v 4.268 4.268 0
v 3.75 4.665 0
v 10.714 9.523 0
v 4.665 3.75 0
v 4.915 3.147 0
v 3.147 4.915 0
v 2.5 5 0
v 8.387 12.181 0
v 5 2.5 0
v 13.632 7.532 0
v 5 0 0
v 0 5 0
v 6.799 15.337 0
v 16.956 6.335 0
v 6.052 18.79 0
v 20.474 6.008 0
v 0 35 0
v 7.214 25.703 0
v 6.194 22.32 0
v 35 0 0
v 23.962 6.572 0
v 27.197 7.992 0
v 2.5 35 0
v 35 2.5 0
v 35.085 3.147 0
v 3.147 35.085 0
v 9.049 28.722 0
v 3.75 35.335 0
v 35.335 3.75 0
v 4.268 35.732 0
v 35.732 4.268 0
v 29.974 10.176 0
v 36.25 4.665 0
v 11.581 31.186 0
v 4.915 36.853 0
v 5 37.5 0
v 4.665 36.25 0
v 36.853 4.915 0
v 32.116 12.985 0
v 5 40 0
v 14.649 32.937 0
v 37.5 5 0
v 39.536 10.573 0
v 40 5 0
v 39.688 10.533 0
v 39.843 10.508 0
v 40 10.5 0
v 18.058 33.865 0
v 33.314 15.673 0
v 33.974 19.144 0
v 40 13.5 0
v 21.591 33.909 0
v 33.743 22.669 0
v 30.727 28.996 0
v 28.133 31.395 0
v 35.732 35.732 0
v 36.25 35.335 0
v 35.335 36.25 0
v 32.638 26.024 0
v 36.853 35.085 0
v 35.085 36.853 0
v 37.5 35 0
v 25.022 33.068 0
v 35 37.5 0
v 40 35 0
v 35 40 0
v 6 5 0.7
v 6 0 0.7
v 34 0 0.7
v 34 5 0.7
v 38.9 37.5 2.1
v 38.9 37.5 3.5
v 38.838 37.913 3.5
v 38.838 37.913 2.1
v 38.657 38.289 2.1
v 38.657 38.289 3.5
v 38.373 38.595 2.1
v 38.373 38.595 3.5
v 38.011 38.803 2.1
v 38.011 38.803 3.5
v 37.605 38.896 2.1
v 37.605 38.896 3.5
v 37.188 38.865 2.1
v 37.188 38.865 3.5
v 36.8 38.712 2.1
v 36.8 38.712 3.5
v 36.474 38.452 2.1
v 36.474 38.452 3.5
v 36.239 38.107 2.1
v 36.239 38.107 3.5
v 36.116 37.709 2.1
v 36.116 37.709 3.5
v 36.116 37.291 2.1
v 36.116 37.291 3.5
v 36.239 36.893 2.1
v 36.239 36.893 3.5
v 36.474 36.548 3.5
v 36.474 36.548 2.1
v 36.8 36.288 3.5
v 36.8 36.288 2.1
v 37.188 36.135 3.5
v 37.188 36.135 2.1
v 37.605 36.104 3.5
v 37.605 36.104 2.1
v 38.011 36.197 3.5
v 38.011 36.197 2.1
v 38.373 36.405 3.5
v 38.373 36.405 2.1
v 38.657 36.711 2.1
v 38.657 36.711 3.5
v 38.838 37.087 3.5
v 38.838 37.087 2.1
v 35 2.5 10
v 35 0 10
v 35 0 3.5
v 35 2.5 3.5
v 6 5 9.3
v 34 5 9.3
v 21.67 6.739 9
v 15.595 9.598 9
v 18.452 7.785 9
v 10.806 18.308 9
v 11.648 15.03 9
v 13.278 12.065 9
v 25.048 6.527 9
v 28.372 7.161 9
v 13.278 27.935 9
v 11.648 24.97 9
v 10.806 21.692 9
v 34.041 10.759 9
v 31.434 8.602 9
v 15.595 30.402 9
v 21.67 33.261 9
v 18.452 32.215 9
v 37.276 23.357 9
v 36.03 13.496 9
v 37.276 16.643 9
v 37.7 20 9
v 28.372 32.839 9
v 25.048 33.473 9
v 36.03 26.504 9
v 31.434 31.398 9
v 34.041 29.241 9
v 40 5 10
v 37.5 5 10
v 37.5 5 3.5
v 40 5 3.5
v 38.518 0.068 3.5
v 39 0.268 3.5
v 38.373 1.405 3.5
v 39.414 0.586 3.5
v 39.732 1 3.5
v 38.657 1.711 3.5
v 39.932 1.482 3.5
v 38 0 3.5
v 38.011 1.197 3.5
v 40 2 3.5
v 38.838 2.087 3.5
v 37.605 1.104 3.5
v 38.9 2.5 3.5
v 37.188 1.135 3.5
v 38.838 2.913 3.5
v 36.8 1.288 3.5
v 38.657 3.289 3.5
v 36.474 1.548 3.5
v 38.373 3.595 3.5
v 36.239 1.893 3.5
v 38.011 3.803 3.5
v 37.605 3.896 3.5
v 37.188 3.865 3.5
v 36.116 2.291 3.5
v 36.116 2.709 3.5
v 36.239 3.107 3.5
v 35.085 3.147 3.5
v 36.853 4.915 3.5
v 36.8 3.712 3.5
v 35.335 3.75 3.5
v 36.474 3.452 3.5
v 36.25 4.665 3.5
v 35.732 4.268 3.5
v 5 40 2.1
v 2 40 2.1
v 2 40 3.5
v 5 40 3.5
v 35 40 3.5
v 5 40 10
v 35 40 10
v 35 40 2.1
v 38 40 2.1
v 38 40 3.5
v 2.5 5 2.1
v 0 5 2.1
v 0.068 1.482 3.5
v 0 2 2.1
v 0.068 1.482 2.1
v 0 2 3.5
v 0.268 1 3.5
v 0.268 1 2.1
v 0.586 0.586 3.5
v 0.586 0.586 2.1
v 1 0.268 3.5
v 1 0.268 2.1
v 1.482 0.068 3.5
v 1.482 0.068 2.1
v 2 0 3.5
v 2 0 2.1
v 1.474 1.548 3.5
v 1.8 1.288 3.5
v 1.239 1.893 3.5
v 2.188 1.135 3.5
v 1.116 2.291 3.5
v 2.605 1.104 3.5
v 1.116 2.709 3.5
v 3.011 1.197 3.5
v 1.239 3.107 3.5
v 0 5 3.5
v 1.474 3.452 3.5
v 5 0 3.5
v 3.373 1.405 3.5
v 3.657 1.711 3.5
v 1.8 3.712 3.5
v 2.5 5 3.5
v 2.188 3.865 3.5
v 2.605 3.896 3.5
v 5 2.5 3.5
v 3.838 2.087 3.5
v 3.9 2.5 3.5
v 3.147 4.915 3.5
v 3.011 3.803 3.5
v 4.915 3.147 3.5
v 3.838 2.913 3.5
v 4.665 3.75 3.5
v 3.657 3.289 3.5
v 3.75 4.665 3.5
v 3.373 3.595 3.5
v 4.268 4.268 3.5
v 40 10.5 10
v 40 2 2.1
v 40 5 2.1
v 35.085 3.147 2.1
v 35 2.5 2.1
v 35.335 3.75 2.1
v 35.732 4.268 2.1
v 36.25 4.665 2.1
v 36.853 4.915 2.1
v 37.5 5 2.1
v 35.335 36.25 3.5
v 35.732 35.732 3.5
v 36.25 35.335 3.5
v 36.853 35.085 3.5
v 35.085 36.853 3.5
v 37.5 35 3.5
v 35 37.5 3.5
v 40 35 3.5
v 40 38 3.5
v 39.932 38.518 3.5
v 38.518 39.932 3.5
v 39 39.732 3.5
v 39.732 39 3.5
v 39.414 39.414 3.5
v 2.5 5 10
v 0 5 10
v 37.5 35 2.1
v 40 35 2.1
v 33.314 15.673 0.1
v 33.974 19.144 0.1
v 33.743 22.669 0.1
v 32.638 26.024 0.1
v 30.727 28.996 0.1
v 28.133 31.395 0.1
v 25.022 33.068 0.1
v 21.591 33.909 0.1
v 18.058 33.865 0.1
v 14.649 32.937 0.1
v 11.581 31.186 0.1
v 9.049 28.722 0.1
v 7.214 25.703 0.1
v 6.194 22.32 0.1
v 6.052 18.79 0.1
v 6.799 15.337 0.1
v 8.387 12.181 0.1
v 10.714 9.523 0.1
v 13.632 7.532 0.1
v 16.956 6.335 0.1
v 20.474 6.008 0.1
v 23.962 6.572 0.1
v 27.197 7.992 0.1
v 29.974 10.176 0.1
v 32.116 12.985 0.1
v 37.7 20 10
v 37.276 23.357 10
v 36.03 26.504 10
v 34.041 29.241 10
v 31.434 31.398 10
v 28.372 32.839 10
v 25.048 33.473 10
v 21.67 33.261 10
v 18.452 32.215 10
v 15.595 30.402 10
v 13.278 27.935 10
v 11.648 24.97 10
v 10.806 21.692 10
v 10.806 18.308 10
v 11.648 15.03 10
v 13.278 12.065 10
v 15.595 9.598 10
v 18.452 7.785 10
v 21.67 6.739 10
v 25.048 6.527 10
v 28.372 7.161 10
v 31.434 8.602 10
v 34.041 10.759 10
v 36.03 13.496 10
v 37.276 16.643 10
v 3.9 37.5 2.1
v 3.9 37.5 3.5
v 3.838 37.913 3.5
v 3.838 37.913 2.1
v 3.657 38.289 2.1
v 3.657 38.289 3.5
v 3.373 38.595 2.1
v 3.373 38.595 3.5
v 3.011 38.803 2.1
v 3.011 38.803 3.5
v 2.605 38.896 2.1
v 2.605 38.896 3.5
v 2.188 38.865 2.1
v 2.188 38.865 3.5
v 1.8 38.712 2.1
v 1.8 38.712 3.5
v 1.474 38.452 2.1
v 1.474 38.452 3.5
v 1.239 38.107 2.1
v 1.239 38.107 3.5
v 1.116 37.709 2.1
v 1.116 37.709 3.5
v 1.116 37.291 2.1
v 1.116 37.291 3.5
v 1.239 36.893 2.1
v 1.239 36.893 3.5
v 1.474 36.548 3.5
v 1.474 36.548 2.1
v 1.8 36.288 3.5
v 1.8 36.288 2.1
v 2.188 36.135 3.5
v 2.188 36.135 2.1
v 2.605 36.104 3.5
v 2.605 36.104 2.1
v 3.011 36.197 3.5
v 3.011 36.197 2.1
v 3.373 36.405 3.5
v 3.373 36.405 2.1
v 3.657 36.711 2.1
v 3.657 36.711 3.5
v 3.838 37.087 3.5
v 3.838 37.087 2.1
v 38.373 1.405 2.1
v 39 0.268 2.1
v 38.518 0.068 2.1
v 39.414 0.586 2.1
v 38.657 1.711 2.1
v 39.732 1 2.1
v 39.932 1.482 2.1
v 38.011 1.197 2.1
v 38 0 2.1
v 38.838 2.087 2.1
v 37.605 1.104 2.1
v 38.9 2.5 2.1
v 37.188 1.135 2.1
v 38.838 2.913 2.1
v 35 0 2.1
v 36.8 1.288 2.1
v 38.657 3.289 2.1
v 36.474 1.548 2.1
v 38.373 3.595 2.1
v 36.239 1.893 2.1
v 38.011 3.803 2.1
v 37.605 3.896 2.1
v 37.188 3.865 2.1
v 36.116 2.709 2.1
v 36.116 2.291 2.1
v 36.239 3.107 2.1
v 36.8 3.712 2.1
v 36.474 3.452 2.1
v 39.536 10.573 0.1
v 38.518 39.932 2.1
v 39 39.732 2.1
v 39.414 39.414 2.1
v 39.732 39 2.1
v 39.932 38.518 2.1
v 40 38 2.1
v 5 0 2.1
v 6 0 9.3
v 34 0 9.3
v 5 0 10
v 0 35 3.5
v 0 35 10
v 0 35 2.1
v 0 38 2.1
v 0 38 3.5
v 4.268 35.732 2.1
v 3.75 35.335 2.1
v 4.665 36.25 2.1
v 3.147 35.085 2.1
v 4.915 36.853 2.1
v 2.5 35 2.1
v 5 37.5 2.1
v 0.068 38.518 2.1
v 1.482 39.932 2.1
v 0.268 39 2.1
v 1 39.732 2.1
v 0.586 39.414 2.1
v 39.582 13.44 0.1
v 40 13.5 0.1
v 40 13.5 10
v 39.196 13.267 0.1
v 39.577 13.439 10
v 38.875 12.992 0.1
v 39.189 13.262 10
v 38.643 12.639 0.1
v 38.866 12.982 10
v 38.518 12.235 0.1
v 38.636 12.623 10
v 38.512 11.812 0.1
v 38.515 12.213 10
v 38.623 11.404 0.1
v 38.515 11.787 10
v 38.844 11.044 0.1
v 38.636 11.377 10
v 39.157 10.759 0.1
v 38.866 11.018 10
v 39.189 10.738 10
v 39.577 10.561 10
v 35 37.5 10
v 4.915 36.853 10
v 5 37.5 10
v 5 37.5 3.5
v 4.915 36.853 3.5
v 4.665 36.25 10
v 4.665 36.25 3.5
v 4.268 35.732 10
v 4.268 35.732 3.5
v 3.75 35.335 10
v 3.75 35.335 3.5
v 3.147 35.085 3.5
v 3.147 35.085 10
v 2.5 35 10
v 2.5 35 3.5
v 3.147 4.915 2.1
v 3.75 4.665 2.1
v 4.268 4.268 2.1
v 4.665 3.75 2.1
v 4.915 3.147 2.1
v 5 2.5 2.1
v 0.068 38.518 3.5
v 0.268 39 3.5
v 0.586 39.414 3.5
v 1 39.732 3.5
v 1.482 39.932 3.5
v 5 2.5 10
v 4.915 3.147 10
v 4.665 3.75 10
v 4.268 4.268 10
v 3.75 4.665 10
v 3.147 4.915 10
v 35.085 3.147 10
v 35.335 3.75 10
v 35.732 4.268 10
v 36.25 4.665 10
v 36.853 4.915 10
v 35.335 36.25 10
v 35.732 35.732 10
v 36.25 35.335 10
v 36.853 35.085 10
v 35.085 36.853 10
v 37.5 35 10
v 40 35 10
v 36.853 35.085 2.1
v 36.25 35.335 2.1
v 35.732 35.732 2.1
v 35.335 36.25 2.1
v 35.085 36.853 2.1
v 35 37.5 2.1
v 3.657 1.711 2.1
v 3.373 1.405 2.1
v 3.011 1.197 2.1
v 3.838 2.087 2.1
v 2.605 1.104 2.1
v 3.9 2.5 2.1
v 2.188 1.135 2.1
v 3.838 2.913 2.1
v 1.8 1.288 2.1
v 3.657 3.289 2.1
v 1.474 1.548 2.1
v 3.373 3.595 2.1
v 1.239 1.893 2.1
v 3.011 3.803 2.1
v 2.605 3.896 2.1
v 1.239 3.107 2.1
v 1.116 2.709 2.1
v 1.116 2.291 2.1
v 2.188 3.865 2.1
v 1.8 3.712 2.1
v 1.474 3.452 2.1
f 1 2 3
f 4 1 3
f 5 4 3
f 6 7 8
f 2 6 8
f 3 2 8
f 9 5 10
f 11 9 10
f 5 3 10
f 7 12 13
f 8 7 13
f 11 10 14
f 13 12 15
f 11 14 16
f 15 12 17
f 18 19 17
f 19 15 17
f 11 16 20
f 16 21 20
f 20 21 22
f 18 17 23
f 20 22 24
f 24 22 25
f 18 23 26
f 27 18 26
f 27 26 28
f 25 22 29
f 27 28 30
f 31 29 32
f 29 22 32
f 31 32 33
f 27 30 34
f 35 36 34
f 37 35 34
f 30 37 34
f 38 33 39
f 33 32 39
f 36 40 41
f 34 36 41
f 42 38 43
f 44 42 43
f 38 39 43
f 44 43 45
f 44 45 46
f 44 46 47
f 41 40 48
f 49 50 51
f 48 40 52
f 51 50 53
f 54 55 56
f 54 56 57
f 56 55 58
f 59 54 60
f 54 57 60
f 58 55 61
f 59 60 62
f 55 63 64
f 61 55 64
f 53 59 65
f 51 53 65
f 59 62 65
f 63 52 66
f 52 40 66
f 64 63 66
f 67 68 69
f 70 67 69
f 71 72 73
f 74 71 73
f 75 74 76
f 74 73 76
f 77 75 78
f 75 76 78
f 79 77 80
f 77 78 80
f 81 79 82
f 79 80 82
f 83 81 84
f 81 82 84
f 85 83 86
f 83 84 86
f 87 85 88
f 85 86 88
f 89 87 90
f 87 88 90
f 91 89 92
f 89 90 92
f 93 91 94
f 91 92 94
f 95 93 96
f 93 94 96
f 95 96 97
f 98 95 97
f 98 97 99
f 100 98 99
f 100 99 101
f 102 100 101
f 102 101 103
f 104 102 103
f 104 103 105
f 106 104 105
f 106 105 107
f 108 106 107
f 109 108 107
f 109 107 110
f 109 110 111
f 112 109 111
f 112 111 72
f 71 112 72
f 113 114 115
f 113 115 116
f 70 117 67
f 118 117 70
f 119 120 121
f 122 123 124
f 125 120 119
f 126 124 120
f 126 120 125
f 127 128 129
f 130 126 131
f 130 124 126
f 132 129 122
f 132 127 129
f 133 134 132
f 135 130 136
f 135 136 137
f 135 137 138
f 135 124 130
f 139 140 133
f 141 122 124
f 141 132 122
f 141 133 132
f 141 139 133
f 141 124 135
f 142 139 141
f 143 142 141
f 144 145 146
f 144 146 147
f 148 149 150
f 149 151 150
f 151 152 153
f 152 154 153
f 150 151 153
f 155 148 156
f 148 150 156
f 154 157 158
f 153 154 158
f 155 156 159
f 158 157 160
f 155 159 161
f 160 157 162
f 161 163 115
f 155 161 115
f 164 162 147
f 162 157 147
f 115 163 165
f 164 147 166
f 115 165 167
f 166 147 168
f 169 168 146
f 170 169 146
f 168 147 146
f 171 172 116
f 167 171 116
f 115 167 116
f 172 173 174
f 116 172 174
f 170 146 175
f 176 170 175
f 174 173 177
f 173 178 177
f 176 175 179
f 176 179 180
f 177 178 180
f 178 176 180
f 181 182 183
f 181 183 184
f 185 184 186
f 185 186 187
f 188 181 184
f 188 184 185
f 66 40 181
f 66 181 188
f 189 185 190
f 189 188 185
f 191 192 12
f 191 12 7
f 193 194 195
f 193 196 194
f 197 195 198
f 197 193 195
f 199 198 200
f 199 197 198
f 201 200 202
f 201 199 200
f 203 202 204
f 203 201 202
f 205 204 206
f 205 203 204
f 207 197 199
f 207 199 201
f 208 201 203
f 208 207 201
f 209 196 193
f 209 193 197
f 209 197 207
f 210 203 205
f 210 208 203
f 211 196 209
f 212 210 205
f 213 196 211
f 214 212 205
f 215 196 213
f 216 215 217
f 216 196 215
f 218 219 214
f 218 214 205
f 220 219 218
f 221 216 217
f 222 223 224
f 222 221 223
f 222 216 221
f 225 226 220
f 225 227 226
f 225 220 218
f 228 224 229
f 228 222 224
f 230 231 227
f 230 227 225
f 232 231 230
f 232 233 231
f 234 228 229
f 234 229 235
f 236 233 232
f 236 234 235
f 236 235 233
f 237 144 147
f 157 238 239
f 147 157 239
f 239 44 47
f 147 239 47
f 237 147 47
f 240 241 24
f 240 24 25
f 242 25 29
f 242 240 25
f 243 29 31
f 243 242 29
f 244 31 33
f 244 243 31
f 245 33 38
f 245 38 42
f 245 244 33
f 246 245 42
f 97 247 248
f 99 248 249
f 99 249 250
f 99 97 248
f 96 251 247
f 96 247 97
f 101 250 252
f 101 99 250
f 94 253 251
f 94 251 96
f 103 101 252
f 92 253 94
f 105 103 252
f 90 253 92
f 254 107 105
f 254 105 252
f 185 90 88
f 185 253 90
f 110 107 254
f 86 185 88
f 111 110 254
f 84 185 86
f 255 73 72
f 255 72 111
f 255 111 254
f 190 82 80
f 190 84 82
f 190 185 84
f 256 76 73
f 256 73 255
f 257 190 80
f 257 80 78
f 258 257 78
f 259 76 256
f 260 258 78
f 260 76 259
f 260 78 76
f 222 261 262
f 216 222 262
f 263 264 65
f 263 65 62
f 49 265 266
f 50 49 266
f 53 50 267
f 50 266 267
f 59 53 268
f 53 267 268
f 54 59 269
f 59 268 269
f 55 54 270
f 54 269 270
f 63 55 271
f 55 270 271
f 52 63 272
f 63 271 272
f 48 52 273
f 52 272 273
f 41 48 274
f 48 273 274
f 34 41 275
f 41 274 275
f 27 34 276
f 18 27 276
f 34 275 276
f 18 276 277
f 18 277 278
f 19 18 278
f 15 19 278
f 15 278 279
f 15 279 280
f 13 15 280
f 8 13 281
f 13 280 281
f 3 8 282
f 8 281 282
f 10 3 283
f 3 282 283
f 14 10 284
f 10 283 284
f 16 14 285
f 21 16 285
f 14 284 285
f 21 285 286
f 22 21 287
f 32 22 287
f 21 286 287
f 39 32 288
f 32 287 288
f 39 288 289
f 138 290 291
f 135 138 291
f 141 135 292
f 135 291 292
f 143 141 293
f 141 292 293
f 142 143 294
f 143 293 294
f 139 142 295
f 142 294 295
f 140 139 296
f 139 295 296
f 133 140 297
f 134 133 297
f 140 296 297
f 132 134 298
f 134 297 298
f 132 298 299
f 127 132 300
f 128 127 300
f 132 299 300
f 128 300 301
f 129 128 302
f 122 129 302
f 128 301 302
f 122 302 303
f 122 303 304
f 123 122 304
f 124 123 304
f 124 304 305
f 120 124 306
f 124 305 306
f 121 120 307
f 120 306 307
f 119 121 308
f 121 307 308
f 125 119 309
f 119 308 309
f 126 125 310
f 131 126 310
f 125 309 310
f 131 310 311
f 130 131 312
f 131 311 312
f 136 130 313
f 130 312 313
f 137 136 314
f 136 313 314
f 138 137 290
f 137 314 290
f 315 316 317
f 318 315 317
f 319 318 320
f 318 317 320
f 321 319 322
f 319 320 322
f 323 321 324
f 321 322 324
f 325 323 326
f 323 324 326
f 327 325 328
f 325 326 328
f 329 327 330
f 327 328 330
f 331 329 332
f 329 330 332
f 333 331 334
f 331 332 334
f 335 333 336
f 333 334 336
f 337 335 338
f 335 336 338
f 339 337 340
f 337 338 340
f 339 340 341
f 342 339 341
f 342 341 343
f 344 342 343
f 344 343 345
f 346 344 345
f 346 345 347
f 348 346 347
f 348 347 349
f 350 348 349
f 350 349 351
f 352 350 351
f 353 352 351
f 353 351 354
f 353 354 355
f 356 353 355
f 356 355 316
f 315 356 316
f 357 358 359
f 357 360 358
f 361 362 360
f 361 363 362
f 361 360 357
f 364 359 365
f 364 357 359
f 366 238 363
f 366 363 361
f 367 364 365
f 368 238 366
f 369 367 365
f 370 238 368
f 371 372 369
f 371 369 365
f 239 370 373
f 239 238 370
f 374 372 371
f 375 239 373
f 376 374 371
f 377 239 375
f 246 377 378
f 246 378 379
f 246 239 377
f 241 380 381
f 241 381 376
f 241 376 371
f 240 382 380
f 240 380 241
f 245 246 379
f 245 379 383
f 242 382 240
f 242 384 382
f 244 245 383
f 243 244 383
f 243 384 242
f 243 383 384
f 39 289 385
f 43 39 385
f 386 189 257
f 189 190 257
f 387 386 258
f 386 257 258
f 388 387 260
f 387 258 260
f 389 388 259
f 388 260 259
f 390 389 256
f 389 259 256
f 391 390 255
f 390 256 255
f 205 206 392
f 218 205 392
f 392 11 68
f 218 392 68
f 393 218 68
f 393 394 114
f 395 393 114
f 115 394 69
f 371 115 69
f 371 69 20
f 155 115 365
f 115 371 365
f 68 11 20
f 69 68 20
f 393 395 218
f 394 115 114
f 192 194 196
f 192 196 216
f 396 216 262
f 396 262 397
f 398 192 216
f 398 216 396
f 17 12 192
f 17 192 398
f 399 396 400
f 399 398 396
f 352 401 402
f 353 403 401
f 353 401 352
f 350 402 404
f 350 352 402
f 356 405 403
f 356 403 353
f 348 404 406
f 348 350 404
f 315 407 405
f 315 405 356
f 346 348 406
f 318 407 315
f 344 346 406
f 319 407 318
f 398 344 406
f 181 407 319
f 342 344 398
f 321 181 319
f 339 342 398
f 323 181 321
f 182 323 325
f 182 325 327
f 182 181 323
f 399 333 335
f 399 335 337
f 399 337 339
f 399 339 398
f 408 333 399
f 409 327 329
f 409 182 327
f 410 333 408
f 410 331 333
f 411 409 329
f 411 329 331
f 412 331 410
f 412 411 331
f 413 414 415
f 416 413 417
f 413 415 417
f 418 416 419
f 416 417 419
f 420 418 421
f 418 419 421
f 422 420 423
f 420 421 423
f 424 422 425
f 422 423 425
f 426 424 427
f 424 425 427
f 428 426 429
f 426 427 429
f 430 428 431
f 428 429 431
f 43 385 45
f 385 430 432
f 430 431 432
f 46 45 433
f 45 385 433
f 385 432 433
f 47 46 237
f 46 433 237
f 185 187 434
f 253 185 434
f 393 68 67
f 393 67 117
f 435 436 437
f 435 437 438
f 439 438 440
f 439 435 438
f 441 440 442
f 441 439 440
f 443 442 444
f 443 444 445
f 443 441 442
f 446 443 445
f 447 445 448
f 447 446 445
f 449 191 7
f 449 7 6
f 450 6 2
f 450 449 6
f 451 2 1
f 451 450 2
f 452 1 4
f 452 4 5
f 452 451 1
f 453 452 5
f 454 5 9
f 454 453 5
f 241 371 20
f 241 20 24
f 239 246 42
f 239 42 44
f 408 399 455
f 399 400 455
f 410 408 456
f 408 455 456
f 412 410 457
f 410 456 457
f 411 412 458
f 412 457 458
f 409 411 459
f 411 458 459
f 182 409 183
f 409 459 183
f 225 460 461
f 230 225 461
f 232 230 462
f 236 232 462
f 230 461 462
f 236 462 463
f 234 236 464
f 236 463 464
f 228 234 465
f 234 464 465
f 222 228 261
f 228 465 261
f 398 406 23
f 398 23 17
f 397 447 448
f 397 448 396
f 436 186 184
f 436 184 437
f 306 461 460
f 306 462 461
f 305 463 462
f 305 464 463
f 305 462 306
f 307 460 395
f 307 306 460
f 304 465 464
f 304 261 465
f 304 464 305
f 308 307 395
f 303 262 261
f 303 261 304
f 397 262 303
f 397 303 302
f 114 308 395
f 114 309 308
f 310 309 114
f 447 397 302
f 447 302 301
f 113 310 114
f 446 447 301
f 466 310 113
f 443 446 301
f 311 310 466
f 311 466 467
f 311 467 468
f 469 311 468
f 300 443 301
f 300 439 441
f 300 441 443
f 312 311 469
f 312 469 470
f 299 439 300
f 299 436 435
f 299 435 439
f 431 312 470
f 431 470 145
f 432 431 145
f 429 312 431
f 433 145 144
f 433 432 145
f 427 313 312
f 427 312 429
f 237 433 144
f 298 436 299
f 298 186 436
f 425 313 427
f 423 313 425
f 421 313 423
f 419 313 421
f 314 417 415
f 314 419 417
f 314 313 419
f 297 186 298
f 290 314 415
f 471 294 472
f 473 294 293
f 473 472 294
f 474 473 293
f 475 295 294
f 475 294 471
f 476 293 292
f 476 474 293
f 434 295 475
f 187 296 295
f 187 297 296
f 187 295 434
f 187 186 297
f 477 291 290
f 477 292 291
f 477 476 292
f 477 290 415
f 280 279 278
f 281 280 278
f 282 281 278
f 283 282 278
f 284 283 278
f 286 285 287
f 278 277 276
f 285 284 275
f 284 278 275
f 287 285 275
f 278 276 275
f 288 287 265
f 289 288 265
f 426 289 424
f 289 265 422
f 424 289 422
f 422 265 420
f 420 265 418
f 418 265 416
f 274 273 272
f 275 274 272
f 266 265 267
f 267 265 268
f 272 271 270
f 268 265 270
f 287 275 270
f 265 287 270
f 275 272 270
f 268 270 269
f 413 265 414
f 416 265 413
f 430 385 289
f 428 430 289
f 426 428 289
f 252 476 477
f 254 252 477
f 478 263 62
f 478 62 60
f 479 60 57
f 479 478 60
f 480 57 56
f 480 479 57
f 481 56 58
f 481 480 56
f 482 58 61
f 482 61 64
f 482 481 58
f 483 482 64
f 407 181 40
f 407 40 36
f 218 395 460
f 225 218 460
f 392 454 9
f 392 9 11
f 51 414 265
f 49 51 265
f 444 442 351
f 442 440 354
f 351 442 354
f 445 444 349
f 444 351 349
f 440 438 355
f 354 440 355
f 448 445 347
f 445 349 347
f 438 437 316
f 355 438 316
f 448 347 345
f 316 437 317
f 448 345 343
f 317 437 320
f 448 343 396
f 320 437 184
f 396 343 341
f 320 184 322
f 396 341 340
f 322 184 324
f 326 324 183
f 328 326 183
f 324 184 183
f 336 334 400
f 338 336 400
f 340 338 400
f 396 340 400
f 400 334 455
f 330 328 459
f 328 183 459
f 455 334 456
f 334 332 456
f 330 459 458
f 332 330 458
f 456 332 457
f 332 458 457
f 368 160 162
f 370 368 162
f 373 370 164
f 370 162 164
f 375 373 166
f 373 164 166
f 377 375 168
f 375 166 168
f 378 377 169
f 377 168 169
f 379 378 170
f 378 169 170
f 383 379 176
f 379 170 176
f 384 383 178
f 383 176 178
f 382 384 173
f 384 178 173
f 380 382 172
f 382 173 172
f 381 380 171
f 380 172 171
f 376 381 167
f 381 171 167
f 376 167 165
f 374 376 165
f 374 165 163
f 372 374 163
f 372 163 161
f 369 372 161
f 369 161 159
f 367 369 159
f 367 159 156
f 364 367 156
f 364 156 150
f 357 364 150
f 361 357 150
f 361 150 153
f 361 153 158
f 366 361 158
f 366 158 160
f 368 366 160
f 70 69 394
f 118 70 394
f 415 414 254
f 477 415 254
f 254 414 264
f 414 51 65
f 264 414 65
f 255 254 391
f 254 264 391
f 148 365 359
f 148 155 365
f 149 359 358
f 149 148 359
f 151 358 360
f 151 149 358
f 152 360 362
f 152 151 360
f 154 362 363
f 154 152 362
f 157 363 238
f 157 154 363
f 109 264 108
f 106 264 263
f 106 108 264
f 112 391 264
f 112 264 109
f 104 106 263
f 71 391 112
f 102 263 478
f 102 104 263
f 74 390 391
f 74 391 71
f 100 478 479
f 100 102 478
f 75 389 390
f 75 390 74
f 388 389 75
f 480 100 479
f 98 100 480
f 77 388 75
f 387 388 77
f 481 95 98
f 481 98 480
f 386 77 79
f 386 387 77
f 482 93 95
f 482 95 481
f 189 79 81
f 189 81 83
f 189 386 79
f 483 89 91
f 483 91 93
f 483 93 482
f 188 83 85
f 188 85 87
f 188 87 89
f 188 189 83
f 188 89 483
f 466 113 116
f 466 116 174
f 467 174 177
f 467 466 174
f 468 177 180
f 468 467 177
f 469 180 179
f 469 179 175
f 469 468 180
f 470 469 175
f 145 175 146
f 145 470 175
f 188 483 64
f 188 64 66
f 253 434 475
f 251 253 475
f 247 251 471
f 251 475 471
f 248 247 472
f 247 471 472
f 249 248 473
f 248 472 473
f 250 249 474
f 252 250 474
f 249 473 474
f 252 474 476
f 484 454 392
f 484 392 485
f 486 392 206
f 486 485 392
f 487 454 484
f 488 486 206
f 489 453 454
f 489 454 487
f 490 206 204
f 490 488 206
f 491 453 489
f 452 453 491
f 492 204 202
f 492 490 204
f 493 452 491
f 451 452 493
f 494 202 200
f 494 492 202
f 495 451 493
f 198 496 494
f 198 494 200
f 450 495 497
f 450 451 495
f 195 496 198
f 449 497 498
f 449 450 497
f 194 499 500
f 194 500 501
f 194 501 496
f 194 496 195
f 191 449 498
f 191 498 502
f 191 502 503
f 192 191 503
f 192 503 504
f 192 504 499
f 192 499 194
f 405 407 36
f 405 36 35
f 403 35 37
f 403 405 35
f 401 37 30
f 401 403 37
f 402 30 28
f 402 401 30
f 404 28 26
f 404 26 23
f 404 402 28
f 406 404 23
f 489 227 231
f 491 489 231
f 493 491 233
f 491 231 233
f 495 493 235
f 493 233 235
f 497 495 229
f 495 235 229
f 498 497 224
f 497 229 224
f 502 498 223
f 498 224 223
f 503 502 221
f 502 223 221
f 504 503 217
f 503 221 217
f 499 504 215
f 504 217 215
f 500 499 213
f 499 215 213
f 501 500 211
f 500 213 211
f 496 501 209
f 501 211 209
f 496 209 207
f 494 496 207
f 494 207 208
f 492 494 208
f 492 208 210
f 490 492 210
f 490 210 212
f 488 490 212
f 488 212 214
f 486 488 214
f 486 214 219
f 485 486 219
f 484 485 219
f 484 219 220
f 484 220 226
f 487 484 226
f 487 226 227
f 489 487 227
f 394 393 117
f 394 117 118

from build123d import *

# Parameters (mm, degrees)
SKETCH_1_W          = 40
SKETCH_1_H          = 40
EXTRUDE_1_DEPTH     = 10
SKETCH_2_R          = 1.4
CUT_EXTRUDE_1_DEPTH = 58.445626465
SKETCH_3_R          = 13.5
CUT_EXTRUDE_2_DEPTH = 1
SKETCH_4_W          = 28
SKETCH_4_H          = 8.6
CUT_EXTRUDE_3_DEPTH = 5
CUT_EXTRUDE_4_DEPTH = 6.5
CUT_EXTRUDE_START   = -2.1
CUT_EXTRUDE_5_DEPTH = 2.1
FILLET_2_R          = 2
SKETCH_8_R          = 1.5
CUT_EXTRUDE_6_DEPTH = 58.445626465
CUT_EXTRUDE_START_2 = -0.1
CUT_EXTRUDE_7_DEPTH = 0.1


with BuildPart() as part:
    # Эскиз1 → Бобышка-Вытянуть1 (new body)
    with BuildSketch(Plane.XY):
        with Locations((20, 20)):
            Rectangle(SKETCH_1_W, SKETCH_1_H)
    extrude(amount=EXTRUDE_1_DEPTH)

    # Эскиз2 → Вырез-Вытянуть1 (cut, through all)
    with BuildSketch(Plane.XY.offset(10)):
        with Locations((2.5, 37.5)):
            Circle(SKETCH_2_R)
        with Locations((37.5, 37.5)):
            Circle(SKETCH_2_R)
        with Locations((37.5, 2.5)):
            Circle(SKETCH_2_R)
        with Locations((2.5, 2.5)):
            Circle(SKETCH_2_R)
    extrude(amount=-CUT_EXTRUDE_1_DEPTH, mode=Mode.SUBTRACT)

    # Эскиз3 → Вырез-Вытянуть2 (cut)
    with BuildSketch(Plane.XY.offset(10)):
        with Locations((24.2, 20)):
            Circle(SKETCH_3_R)
    extrude(amount=-CUT_EXTRUDE_2_DEPTH, mode=Mode.SUBTRACT)

    # Эскиз4 → Вырез-Вытянуть3 (cut)
    with BuildSketch(Plane.XZ):
        with Locations((20, 5)):
            Rectangle(SKETCH_4_W, SKETCH_4_H)
    extrude(amount=-CUT_EXTRUDE_3_DEPTH, mode=Mode.SUBTRACT)

    # Эскиз5 → Вырез-Вытянуть4 (cut)
    with BuildSketch(Plane.XY.offset(10)):
        with BuildLine():
            Line((2.5, 35), (0, 35))
            Line((0, 35), (0, 40))
            Line((0, 40), (5, 40))
            Line((5, 40), (5, 37.5))
            ThreePointArc((5, 37.5), (4.267766953, 35.732233047), (2.5, 35))
        make_face()
        with BuildLine():
            Line((35, 40), (35, 37.5))
            ThreePointArc((35, 37.5), (35.732233047, 35.732233047), (37.5, 35))
            Line((37.5, 35), (40, 35))
            Line((40, 35), (40, 40))
            Line((40, 40), (35, 40))
        make_face()
        with BuildLine():
            Line((37.5, 5), (40, 5))
            Line((40, 5), (40, 0))
            Line((40, 0), (35, 0))
            Line((35, 0), (35, 2.5))
            ThreePointArc((35, 2.5), (35.732233047, 4.267766953), (37.5, 5))
        make_face()
        with BuildLine():
            Line((5, 0), (5, 2.5))
            ThreePointArc((5, 2.5), (4.267766953, 4.267766953), (2.5, 5))
            Line((2.5, 5), (0, 5))
            Line((0, 5), (0, 0))
            Line((0, 0), (5, 0))
        make_face()
    extrude(amount=-CUT_EXTRUDE_4_DEPTH, mode=Mode.SUBTRACT)

    # Эскиз6 → Вырез-Вытянуть5 (cut)
    with BuildSketch(Plane(origin=(0, 0, 0), x_dir=(-1, 0, 0), z_dir=(0, 0, -1)).offset(CUT_EXTRUDE_START)):
        with BuildLine():
            Line((-2.5, 35), (0, 35))
            Line((0, 35), (0, 40))
            Line((0, 40), (-5, 40))
            Line((-5, 40), (-5, 37.5))
            ThreePointArc((-5, 37.5), (-4.267766953, 35.732233047), (-2.5, 35))
        make_face()
        with BuildLine():
            Line((-35, 37.5), (-35, 40))
            Line((-35, 40), (-40, 40))
            Line((-40, 40), (-40, 35))
            Line((-40, 35), (-37.5, 35))
            ThreePointArc((-37.5, 35), (-35.732233047, 35.732233047), (-35, 37.5))
        make_face()
        with BuildLine():
            Line((-5, 0), (0, 0))
            Line((0, 0), (0, 5))
            Line((0, 5), (-2.5, 5))
            ThreePointArc((-2.5, 5), (-4.267766953, 4.267766953), (-5, 2.5))
            Line((-5, 2.5), (-5, 0))
        make_face()
        with BuildLine():
            Line((-40, 5), (-40, 0))
            Line((-40, 0), (-35, 0))
            Line((-35, 0), (-35, 2.5))
            ThreePointArc((-35, 2.5), (-35.732233047, 4.267766953), (-37.5, 5))
            Line((-37.5, 5), (-40, 5))
        make_face()
    extrude(amount=CUT_EXTRUDE_5_DEPTH, mode=Mode.SUBTRACT)

    # Скругление2
    fillet_2_edges = [part.edges().sort_by_distance(p)[0] for p in [
        (0, 40, 2.8),
        (40, 40, 2.8),
        (40, 0, 2.8),
        (0, 0, 2.8),
    ]]
    fillet(fillet_2_edges, radius=FILLET_2_R)

    # Эскиз8 → Вырез-Вытянуть6 (cut, through all)
    with BuildSketch(Plane.XY.offset(10)):
        with Locations((40, 12)):
            Circle(SKETCH_8_R)
    extrude(amount=-CUT_EXTRUDE_6_DEPTH, mode=Mode.SUBTRACT)

    # Эскиз9 → Вырез-Вытянуть7 (cut)
    with BuildSketch(Plane(origin=(0, 0, 0), x_dir=(-1, 0, 0), z_dir=(0, 0, -1)).offset(CUT_EXTRUDE_START_2)):
        with BuildLine():
            Line((-40, 13.5), (-33.314476962, 15.672794987))
            ThreePointArc((-33.314476962, 15.672794987), (-7.214062681, 25.702614039), (-32.115767056, 12.985145144))
            Line((-32.115767056, 12.985145144), (-39.536370891, 10.573448897))
            ThreePointArc((-39.536370891, 10.573448897), (-38.518476012, 12.234705502), (-40, 13.5))
        make_face()
    extrude(amount=CUT_EXTRUDE_7_DEPTH, mode=Mode.SUBTRACT)


solid = part.part
